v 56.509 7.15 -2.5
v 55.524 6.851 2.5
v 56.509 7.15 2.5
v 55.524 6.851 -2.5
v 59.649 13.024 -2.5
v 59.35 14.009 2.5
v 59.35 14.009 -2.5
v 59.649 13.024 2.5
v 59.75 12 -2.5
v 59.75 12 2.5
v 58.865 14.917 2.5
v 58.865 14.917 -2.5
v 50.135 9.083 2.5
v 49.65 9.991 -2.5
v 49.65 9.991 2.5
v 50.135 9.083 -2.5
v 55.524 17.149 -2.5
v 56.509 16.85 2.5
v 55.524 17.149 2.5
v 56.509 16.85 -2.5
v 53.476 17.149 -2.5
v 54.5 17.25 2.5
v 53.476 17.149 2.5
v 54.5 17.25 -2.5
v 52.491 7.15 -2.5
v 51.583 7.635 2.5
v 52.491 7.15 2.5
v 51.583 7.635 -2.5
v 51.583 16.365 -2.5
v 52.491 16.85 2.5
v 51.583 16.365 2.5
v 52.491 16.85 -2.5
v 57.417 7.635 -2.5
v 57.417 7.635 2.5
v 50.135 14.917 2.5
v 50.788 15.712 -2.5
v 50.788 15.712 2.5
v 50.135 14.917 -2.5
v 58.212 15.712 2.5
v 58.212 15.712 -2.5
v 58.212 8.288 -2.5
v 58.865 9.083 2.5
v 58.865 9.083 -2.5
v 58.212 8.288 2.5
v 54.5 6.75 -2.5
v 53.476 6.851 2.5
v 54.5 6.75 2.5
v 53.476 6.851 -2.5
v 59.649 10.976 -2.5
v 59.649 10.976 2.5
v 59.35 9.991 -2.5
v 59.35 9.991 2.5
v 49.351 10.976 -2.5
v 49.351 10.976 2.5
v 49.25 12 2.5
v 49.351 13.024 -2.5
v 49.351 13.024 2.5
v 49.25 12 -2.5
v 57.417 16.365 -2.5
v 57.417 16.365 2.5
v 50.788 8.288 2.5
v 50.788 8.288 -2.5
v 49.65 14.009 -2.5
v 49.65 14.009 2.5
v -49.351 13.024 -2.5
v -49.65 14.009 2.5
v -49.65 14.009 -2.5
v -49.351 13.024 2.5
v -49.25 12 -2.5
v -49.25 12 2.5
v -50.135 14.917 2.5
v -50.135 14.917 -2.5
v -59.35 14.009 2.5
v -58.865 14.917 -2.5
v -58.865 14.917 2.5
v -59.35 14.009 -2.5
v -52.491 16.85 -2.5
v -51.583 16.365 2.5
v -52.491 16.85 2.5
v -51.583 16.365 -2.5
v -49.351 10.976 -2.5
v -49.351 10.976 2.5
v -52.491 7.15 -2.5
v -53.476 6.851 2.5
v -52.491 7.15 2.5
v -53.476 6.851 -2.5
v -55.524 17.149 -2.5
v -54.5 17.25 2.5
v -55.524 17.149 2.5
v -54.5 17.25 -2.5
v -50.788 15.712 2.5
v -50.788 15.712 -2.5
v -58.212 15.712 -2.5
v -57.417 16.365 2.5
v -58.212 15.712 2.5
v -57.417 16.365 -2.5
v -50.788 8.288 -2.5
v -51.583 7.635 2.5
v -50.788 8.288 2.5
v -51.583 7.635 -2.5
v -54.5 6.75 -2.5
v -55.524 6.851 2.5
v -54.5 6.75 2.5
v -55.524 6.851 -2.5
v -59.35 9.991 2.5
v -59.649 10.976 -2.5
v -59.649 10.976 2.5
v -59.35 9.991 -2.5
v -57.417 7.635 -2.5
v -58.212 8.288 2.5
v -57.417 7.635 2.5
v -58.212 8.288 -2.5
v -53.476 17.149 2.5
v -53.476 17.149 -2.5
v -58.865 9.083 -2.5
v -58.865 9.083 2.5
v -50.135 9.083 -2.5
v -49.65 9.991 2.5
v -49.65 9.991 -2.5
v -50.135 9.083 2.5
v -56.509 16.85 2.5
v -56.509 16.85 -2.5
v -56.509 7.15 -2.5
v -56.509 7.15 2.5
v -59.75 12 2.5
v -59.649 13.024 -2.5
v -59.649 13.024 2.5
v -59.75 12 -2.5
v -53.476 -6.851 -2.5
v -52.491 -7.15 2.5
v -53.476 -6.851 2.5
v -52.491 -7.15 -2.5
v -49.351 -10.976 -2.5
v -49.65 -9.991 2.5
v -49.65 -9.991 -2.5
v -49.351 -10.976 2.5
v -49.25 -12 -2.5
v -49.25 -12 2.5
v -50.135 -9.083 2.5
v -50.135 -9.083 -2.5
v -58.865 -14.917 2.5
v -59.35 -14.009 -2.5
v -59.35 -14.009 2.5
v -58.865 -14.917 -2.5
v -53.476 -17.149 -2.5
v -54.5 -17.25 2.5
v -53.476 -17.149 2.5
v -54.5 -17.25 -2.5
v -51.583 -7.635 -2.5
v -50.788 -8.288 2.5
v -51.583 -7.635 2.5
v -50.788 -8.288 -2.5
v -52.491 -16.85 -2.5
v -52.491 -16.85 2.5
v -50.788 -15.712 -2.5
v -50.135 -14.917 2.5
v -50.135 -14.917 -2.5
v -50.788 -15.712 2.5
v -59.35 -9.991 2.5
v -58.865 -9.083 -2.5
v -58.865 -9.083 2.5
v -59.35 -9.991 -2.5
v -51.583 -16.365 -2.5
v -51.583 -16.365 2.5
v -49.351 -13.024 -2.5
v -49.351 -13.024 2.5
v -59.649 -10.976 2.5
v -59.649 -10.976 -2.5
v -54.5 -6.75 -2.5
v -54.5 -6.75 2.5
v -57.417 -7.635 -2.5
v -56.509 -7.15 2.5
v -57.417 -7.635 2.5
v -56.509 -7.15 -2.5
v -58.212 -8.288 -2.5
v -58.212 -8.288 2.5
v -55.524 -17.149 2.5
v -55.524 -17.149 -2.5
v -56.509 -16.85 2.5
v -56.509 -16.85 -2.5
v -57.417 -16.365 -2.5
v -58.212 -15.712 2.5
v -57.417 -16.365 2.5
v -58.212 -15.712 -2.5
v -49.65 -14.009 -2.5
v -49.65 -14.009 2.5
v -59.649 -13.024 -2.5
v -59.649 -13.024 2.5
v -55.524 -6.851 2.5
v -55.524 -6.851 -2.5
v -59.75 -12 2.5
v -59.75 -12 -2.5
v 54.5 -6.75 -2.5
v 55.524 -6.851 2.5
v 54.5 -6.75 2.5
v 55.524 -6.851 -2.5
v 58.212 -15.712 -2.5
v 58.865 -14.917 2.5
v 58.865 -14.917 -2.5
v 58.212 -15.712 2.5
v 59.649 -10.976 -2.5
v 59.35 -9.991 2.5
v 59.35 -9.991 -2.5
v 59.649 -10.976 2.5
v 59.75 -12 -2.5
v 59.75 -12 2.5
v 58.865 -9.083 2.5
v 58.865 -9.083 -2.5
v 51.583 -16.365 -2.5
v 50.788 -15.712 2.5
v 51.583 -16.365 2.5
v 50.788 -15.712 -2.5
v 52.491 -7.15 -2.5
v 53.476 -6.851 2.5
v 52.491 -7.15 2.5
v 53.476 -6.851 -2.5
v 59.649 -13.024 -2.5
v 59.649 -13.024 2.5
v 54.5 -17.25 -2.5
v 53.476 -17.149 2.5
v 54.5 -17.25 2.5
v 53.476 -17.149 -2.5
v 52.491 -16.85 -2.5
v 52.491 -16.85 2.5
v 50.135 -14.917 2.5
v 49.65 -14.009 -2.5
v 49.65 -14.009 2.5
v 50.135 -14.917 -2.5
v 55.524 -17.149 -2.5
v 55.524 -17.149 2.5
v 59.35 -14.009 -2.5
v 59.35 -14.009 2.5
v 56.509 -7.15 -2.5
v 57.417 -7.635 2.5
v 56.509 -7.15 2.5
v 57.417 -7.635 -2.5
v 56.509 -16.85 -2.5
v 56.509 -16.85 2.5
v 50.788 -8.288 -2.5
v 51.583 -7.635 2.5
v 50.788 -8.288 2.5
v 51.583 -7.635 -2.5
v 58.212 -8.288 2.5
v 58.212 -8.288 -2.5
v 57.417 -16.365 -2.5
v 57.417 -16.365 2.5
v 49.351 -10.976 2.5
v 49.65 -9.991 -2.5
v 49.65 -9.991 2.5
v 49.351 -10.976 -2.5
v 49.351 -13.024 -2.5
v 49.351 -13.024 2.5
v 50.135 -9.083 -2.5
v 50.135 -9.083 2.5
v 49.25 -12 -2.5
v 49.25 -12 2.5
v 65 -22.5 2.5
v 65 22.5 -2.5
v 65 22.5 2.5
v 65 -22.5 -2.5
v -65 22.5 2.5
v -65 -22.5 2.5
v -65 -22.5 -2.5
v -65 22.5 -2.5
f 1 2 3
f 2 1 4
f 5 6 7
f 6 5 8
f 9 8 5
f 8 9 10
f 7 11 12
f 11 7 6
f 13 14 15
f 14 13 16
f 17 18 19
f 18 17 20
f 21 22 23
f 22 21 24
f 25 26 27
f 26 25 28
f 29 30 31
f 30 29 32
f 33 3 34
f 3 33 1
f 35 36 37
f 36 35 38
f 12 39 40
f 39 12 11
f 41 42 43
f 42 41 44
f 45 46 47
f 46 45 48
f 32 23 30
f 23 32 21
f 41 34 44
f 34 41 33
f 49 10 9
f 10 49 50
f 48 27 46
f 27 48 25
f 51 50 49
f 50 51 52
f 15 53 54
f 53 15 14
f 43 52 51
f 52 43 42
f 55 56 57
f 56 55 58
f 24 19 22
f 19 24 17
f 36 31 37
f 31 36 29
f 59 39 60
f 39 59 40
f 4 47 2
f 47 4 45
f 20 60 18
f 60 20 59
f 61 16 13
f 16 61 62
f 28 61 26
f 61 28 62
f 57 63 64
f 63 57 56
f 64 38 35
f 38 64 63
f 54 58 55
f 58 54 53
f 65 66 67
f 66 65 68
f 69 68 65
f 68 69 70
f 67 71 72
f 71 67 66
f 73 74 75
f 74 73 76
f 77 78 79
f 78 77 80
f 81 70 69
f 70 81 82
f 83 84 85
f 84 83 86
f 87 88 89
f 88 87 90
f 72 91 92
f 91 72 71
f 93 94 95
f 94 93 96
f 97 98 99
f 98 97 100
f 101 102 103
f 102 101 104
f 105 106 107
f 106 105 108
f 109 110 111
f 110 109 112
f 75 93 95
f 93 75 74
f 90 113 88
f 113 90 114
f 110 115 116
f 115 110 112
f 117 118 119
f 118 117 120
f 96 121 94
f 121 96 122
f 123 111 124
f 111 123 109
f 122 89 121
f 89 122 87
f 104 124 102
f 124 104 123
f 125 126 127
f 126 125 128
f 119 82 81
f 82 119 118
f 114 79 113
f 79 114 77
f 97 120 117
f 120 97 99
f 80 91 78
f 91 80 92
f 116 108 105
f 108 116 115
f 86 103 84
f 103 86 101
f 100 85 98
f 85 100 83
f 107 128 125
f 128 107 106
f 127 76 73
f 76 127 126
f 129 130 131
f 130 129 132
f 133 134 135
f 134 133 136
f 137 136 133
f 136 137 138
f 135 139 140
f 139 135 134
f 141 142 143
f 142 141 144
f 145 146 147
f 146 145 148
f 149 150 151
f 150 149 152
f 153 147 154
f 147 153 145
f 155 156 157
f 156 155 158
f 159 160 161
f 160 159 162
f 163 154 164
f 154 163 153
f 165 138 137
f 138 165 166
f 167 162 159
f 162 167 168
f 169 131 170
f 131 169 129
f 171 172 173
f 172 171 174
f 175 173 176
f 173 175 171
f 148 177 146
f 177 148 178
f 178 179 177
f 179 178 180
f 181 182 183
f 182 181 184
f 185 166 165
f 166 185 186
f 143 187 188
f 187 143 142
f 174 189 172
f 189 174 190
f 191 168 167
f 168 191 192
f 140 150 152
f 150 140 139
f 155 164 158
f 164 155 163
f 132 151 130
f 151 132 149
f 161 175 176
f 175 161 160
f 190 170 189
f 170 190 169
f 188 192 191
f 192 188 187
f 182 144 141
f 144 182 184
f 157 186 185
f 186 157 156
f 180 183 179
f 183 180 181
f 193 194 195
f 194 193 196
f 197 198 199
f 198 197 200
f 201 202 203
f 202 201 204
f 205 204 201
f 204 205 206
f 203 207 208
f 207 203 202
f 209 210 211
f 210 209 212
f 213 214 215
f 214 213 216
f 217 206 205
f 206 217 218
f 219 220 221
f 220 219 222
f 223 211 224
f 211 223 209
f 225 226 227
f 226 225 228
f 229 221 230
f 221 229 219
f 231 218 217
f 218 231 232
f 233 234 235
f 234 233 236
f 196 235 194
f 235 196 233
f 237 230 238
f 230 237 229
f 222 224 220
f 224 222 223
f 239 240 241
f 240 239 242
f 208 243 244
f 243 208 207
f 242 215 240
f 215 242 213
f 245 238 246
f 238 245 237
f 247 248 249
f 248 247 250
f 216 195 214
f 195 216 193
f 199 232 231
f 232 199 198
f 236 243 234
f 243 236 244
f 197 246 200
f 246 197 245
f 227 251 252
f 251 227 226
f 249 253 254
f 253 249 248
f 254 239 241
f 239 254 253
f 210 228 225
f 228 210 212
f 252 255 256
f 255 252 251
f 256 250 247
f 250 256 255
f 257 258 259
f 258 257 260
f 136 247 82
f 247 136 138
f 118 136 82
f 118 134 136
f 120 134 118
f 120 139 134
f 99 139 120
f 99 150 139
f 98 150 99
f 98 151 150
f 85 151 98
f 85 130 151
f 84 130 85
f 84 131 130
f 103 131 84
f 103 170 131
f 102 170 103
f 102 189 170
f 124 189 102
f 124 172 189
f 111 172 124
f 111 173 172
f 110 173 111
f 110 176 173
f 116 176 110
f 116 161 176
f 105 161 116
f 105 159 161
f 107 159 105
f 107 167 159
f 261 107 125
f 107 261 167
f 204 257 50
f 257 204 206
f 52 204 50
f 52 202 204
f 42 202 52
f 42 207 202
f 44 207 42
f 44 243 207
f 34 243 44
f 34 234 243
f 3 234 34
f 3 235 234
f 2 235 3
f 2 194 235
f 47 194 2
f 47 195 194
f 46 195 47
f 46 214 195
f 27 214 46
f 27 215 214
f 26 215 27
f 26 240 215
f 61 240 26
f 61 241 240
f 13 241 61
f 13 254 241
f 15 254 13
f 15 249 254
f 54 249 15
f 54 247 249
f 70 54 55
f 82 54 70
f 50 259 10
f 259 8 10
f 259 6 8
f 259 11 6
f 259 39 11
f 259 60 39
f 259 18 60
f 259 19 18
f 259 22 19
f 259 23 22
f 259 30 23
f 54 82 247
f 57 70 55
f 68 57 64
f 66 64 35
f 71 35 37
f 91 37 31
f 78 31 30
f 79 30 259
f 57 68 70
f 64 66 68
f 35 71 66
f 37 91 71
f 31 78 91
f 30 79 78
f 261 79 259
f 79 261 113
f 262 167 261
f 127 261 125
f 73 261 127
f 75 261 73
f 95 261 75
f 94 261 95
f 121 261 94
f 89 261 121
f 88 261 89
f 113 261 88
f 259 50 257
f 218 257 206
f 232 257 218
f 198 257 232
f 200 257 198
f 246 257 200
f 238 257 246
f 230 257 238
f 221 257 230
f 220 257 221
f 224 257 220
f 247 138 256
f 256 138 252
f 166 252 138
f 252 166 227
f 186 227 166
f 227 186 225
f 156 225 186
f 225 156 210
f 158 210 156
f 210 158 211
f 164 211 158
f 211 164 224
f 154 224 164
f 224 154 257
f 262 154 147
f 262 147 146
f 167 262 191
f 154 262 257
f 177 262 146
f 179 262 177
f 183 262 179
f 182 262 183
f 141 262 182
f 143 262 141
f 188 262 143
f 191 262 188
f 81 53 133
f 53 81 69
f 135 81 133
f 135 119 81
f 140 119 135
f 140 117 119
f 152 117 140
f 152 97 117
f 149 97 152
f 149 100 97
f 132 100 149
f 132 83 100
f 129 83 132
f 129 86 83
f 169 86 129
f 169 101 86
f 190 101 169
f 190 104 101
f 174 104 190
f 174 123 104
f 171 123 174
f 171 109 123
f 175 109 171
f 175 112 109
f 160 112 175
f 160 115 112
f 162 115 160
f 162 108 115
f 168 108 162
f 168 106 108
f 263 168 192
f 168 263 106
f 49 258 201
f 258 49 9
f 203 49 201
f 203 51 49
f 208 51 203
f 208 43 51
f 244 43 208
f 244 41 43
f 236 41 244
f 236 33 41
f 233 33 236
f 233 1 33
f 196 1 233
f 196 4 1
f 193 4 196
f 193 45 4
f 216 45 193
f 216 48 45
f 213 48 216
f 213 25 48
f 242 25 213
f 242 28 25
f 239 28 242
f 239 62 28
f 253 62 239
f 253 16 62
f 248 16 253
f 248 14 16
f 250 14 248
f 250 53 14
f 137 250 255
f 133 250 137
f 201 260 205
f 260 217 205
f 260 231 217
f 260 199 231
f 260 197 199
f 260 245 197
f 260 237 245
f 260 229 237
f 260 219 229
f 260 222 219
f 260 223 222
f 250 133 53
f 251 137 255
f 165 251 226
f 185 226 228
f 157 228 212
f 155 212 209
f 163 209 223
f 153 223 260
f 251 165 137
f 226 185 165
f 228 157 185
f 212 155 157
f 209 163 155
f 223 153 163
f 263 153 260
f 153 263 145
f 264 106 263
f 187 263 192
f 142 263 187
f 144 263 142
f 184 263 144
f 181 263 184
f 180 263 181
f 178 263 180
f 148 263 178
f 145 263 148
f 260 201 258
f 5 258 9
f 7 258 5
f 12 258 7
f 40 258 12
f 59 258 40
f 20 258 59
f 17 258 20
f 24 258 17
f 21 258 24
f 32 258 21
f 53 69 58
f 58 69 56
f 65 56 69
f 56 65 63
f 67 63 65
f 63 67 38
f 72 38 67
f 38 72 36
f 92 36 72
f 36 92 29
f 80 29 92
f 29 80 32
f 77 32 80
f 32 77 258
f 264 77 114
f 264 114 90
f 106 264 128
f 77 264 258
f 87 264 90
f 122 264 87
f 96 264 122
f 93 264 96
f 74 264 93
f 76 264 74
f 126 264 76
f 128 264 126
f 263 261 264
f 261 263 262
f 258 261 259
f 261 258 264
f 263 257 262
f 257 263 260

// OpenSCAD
$fn = 32;

// ----------------------------------------------------------------------
// Corner plate 130 x 45 x 5
// 4 holes, centres taken from the edge offset
// ----------------------------------------------------------------------

// --- parameters (mm) ---
plate = [130, 45, 5];  // overall size (x, y, z)
holes = 4;             // number of holes the drawing asks for
hole_d = 10.5;         // hole diameter
edge = 10.5;           // hole centre offset from the plate edge

// --- derived feature positions (mm) ---
corner_x = plate[0] / 2 - edge;  // = 54.5   corner hole X
corner_y = plate[1] / 2 - edge;  // = 12   corner hole Y
feature_centers = [
  [corner_x, corner_y],
  [-corner_x, corner_y],
  [-corner_x, -corner_y],
  [corner_x, -corner_y]
];   // hole centres the loop below drills

// plate outline, every hole drilled through with the same cutters
difference() {
  cube(plate, center = true);
  for (centre = feature_centers)
    translate([centre[0], centre[1], 0])
      cylinder(d = hole_d, h = plate[2] + 2, center = true);
}
